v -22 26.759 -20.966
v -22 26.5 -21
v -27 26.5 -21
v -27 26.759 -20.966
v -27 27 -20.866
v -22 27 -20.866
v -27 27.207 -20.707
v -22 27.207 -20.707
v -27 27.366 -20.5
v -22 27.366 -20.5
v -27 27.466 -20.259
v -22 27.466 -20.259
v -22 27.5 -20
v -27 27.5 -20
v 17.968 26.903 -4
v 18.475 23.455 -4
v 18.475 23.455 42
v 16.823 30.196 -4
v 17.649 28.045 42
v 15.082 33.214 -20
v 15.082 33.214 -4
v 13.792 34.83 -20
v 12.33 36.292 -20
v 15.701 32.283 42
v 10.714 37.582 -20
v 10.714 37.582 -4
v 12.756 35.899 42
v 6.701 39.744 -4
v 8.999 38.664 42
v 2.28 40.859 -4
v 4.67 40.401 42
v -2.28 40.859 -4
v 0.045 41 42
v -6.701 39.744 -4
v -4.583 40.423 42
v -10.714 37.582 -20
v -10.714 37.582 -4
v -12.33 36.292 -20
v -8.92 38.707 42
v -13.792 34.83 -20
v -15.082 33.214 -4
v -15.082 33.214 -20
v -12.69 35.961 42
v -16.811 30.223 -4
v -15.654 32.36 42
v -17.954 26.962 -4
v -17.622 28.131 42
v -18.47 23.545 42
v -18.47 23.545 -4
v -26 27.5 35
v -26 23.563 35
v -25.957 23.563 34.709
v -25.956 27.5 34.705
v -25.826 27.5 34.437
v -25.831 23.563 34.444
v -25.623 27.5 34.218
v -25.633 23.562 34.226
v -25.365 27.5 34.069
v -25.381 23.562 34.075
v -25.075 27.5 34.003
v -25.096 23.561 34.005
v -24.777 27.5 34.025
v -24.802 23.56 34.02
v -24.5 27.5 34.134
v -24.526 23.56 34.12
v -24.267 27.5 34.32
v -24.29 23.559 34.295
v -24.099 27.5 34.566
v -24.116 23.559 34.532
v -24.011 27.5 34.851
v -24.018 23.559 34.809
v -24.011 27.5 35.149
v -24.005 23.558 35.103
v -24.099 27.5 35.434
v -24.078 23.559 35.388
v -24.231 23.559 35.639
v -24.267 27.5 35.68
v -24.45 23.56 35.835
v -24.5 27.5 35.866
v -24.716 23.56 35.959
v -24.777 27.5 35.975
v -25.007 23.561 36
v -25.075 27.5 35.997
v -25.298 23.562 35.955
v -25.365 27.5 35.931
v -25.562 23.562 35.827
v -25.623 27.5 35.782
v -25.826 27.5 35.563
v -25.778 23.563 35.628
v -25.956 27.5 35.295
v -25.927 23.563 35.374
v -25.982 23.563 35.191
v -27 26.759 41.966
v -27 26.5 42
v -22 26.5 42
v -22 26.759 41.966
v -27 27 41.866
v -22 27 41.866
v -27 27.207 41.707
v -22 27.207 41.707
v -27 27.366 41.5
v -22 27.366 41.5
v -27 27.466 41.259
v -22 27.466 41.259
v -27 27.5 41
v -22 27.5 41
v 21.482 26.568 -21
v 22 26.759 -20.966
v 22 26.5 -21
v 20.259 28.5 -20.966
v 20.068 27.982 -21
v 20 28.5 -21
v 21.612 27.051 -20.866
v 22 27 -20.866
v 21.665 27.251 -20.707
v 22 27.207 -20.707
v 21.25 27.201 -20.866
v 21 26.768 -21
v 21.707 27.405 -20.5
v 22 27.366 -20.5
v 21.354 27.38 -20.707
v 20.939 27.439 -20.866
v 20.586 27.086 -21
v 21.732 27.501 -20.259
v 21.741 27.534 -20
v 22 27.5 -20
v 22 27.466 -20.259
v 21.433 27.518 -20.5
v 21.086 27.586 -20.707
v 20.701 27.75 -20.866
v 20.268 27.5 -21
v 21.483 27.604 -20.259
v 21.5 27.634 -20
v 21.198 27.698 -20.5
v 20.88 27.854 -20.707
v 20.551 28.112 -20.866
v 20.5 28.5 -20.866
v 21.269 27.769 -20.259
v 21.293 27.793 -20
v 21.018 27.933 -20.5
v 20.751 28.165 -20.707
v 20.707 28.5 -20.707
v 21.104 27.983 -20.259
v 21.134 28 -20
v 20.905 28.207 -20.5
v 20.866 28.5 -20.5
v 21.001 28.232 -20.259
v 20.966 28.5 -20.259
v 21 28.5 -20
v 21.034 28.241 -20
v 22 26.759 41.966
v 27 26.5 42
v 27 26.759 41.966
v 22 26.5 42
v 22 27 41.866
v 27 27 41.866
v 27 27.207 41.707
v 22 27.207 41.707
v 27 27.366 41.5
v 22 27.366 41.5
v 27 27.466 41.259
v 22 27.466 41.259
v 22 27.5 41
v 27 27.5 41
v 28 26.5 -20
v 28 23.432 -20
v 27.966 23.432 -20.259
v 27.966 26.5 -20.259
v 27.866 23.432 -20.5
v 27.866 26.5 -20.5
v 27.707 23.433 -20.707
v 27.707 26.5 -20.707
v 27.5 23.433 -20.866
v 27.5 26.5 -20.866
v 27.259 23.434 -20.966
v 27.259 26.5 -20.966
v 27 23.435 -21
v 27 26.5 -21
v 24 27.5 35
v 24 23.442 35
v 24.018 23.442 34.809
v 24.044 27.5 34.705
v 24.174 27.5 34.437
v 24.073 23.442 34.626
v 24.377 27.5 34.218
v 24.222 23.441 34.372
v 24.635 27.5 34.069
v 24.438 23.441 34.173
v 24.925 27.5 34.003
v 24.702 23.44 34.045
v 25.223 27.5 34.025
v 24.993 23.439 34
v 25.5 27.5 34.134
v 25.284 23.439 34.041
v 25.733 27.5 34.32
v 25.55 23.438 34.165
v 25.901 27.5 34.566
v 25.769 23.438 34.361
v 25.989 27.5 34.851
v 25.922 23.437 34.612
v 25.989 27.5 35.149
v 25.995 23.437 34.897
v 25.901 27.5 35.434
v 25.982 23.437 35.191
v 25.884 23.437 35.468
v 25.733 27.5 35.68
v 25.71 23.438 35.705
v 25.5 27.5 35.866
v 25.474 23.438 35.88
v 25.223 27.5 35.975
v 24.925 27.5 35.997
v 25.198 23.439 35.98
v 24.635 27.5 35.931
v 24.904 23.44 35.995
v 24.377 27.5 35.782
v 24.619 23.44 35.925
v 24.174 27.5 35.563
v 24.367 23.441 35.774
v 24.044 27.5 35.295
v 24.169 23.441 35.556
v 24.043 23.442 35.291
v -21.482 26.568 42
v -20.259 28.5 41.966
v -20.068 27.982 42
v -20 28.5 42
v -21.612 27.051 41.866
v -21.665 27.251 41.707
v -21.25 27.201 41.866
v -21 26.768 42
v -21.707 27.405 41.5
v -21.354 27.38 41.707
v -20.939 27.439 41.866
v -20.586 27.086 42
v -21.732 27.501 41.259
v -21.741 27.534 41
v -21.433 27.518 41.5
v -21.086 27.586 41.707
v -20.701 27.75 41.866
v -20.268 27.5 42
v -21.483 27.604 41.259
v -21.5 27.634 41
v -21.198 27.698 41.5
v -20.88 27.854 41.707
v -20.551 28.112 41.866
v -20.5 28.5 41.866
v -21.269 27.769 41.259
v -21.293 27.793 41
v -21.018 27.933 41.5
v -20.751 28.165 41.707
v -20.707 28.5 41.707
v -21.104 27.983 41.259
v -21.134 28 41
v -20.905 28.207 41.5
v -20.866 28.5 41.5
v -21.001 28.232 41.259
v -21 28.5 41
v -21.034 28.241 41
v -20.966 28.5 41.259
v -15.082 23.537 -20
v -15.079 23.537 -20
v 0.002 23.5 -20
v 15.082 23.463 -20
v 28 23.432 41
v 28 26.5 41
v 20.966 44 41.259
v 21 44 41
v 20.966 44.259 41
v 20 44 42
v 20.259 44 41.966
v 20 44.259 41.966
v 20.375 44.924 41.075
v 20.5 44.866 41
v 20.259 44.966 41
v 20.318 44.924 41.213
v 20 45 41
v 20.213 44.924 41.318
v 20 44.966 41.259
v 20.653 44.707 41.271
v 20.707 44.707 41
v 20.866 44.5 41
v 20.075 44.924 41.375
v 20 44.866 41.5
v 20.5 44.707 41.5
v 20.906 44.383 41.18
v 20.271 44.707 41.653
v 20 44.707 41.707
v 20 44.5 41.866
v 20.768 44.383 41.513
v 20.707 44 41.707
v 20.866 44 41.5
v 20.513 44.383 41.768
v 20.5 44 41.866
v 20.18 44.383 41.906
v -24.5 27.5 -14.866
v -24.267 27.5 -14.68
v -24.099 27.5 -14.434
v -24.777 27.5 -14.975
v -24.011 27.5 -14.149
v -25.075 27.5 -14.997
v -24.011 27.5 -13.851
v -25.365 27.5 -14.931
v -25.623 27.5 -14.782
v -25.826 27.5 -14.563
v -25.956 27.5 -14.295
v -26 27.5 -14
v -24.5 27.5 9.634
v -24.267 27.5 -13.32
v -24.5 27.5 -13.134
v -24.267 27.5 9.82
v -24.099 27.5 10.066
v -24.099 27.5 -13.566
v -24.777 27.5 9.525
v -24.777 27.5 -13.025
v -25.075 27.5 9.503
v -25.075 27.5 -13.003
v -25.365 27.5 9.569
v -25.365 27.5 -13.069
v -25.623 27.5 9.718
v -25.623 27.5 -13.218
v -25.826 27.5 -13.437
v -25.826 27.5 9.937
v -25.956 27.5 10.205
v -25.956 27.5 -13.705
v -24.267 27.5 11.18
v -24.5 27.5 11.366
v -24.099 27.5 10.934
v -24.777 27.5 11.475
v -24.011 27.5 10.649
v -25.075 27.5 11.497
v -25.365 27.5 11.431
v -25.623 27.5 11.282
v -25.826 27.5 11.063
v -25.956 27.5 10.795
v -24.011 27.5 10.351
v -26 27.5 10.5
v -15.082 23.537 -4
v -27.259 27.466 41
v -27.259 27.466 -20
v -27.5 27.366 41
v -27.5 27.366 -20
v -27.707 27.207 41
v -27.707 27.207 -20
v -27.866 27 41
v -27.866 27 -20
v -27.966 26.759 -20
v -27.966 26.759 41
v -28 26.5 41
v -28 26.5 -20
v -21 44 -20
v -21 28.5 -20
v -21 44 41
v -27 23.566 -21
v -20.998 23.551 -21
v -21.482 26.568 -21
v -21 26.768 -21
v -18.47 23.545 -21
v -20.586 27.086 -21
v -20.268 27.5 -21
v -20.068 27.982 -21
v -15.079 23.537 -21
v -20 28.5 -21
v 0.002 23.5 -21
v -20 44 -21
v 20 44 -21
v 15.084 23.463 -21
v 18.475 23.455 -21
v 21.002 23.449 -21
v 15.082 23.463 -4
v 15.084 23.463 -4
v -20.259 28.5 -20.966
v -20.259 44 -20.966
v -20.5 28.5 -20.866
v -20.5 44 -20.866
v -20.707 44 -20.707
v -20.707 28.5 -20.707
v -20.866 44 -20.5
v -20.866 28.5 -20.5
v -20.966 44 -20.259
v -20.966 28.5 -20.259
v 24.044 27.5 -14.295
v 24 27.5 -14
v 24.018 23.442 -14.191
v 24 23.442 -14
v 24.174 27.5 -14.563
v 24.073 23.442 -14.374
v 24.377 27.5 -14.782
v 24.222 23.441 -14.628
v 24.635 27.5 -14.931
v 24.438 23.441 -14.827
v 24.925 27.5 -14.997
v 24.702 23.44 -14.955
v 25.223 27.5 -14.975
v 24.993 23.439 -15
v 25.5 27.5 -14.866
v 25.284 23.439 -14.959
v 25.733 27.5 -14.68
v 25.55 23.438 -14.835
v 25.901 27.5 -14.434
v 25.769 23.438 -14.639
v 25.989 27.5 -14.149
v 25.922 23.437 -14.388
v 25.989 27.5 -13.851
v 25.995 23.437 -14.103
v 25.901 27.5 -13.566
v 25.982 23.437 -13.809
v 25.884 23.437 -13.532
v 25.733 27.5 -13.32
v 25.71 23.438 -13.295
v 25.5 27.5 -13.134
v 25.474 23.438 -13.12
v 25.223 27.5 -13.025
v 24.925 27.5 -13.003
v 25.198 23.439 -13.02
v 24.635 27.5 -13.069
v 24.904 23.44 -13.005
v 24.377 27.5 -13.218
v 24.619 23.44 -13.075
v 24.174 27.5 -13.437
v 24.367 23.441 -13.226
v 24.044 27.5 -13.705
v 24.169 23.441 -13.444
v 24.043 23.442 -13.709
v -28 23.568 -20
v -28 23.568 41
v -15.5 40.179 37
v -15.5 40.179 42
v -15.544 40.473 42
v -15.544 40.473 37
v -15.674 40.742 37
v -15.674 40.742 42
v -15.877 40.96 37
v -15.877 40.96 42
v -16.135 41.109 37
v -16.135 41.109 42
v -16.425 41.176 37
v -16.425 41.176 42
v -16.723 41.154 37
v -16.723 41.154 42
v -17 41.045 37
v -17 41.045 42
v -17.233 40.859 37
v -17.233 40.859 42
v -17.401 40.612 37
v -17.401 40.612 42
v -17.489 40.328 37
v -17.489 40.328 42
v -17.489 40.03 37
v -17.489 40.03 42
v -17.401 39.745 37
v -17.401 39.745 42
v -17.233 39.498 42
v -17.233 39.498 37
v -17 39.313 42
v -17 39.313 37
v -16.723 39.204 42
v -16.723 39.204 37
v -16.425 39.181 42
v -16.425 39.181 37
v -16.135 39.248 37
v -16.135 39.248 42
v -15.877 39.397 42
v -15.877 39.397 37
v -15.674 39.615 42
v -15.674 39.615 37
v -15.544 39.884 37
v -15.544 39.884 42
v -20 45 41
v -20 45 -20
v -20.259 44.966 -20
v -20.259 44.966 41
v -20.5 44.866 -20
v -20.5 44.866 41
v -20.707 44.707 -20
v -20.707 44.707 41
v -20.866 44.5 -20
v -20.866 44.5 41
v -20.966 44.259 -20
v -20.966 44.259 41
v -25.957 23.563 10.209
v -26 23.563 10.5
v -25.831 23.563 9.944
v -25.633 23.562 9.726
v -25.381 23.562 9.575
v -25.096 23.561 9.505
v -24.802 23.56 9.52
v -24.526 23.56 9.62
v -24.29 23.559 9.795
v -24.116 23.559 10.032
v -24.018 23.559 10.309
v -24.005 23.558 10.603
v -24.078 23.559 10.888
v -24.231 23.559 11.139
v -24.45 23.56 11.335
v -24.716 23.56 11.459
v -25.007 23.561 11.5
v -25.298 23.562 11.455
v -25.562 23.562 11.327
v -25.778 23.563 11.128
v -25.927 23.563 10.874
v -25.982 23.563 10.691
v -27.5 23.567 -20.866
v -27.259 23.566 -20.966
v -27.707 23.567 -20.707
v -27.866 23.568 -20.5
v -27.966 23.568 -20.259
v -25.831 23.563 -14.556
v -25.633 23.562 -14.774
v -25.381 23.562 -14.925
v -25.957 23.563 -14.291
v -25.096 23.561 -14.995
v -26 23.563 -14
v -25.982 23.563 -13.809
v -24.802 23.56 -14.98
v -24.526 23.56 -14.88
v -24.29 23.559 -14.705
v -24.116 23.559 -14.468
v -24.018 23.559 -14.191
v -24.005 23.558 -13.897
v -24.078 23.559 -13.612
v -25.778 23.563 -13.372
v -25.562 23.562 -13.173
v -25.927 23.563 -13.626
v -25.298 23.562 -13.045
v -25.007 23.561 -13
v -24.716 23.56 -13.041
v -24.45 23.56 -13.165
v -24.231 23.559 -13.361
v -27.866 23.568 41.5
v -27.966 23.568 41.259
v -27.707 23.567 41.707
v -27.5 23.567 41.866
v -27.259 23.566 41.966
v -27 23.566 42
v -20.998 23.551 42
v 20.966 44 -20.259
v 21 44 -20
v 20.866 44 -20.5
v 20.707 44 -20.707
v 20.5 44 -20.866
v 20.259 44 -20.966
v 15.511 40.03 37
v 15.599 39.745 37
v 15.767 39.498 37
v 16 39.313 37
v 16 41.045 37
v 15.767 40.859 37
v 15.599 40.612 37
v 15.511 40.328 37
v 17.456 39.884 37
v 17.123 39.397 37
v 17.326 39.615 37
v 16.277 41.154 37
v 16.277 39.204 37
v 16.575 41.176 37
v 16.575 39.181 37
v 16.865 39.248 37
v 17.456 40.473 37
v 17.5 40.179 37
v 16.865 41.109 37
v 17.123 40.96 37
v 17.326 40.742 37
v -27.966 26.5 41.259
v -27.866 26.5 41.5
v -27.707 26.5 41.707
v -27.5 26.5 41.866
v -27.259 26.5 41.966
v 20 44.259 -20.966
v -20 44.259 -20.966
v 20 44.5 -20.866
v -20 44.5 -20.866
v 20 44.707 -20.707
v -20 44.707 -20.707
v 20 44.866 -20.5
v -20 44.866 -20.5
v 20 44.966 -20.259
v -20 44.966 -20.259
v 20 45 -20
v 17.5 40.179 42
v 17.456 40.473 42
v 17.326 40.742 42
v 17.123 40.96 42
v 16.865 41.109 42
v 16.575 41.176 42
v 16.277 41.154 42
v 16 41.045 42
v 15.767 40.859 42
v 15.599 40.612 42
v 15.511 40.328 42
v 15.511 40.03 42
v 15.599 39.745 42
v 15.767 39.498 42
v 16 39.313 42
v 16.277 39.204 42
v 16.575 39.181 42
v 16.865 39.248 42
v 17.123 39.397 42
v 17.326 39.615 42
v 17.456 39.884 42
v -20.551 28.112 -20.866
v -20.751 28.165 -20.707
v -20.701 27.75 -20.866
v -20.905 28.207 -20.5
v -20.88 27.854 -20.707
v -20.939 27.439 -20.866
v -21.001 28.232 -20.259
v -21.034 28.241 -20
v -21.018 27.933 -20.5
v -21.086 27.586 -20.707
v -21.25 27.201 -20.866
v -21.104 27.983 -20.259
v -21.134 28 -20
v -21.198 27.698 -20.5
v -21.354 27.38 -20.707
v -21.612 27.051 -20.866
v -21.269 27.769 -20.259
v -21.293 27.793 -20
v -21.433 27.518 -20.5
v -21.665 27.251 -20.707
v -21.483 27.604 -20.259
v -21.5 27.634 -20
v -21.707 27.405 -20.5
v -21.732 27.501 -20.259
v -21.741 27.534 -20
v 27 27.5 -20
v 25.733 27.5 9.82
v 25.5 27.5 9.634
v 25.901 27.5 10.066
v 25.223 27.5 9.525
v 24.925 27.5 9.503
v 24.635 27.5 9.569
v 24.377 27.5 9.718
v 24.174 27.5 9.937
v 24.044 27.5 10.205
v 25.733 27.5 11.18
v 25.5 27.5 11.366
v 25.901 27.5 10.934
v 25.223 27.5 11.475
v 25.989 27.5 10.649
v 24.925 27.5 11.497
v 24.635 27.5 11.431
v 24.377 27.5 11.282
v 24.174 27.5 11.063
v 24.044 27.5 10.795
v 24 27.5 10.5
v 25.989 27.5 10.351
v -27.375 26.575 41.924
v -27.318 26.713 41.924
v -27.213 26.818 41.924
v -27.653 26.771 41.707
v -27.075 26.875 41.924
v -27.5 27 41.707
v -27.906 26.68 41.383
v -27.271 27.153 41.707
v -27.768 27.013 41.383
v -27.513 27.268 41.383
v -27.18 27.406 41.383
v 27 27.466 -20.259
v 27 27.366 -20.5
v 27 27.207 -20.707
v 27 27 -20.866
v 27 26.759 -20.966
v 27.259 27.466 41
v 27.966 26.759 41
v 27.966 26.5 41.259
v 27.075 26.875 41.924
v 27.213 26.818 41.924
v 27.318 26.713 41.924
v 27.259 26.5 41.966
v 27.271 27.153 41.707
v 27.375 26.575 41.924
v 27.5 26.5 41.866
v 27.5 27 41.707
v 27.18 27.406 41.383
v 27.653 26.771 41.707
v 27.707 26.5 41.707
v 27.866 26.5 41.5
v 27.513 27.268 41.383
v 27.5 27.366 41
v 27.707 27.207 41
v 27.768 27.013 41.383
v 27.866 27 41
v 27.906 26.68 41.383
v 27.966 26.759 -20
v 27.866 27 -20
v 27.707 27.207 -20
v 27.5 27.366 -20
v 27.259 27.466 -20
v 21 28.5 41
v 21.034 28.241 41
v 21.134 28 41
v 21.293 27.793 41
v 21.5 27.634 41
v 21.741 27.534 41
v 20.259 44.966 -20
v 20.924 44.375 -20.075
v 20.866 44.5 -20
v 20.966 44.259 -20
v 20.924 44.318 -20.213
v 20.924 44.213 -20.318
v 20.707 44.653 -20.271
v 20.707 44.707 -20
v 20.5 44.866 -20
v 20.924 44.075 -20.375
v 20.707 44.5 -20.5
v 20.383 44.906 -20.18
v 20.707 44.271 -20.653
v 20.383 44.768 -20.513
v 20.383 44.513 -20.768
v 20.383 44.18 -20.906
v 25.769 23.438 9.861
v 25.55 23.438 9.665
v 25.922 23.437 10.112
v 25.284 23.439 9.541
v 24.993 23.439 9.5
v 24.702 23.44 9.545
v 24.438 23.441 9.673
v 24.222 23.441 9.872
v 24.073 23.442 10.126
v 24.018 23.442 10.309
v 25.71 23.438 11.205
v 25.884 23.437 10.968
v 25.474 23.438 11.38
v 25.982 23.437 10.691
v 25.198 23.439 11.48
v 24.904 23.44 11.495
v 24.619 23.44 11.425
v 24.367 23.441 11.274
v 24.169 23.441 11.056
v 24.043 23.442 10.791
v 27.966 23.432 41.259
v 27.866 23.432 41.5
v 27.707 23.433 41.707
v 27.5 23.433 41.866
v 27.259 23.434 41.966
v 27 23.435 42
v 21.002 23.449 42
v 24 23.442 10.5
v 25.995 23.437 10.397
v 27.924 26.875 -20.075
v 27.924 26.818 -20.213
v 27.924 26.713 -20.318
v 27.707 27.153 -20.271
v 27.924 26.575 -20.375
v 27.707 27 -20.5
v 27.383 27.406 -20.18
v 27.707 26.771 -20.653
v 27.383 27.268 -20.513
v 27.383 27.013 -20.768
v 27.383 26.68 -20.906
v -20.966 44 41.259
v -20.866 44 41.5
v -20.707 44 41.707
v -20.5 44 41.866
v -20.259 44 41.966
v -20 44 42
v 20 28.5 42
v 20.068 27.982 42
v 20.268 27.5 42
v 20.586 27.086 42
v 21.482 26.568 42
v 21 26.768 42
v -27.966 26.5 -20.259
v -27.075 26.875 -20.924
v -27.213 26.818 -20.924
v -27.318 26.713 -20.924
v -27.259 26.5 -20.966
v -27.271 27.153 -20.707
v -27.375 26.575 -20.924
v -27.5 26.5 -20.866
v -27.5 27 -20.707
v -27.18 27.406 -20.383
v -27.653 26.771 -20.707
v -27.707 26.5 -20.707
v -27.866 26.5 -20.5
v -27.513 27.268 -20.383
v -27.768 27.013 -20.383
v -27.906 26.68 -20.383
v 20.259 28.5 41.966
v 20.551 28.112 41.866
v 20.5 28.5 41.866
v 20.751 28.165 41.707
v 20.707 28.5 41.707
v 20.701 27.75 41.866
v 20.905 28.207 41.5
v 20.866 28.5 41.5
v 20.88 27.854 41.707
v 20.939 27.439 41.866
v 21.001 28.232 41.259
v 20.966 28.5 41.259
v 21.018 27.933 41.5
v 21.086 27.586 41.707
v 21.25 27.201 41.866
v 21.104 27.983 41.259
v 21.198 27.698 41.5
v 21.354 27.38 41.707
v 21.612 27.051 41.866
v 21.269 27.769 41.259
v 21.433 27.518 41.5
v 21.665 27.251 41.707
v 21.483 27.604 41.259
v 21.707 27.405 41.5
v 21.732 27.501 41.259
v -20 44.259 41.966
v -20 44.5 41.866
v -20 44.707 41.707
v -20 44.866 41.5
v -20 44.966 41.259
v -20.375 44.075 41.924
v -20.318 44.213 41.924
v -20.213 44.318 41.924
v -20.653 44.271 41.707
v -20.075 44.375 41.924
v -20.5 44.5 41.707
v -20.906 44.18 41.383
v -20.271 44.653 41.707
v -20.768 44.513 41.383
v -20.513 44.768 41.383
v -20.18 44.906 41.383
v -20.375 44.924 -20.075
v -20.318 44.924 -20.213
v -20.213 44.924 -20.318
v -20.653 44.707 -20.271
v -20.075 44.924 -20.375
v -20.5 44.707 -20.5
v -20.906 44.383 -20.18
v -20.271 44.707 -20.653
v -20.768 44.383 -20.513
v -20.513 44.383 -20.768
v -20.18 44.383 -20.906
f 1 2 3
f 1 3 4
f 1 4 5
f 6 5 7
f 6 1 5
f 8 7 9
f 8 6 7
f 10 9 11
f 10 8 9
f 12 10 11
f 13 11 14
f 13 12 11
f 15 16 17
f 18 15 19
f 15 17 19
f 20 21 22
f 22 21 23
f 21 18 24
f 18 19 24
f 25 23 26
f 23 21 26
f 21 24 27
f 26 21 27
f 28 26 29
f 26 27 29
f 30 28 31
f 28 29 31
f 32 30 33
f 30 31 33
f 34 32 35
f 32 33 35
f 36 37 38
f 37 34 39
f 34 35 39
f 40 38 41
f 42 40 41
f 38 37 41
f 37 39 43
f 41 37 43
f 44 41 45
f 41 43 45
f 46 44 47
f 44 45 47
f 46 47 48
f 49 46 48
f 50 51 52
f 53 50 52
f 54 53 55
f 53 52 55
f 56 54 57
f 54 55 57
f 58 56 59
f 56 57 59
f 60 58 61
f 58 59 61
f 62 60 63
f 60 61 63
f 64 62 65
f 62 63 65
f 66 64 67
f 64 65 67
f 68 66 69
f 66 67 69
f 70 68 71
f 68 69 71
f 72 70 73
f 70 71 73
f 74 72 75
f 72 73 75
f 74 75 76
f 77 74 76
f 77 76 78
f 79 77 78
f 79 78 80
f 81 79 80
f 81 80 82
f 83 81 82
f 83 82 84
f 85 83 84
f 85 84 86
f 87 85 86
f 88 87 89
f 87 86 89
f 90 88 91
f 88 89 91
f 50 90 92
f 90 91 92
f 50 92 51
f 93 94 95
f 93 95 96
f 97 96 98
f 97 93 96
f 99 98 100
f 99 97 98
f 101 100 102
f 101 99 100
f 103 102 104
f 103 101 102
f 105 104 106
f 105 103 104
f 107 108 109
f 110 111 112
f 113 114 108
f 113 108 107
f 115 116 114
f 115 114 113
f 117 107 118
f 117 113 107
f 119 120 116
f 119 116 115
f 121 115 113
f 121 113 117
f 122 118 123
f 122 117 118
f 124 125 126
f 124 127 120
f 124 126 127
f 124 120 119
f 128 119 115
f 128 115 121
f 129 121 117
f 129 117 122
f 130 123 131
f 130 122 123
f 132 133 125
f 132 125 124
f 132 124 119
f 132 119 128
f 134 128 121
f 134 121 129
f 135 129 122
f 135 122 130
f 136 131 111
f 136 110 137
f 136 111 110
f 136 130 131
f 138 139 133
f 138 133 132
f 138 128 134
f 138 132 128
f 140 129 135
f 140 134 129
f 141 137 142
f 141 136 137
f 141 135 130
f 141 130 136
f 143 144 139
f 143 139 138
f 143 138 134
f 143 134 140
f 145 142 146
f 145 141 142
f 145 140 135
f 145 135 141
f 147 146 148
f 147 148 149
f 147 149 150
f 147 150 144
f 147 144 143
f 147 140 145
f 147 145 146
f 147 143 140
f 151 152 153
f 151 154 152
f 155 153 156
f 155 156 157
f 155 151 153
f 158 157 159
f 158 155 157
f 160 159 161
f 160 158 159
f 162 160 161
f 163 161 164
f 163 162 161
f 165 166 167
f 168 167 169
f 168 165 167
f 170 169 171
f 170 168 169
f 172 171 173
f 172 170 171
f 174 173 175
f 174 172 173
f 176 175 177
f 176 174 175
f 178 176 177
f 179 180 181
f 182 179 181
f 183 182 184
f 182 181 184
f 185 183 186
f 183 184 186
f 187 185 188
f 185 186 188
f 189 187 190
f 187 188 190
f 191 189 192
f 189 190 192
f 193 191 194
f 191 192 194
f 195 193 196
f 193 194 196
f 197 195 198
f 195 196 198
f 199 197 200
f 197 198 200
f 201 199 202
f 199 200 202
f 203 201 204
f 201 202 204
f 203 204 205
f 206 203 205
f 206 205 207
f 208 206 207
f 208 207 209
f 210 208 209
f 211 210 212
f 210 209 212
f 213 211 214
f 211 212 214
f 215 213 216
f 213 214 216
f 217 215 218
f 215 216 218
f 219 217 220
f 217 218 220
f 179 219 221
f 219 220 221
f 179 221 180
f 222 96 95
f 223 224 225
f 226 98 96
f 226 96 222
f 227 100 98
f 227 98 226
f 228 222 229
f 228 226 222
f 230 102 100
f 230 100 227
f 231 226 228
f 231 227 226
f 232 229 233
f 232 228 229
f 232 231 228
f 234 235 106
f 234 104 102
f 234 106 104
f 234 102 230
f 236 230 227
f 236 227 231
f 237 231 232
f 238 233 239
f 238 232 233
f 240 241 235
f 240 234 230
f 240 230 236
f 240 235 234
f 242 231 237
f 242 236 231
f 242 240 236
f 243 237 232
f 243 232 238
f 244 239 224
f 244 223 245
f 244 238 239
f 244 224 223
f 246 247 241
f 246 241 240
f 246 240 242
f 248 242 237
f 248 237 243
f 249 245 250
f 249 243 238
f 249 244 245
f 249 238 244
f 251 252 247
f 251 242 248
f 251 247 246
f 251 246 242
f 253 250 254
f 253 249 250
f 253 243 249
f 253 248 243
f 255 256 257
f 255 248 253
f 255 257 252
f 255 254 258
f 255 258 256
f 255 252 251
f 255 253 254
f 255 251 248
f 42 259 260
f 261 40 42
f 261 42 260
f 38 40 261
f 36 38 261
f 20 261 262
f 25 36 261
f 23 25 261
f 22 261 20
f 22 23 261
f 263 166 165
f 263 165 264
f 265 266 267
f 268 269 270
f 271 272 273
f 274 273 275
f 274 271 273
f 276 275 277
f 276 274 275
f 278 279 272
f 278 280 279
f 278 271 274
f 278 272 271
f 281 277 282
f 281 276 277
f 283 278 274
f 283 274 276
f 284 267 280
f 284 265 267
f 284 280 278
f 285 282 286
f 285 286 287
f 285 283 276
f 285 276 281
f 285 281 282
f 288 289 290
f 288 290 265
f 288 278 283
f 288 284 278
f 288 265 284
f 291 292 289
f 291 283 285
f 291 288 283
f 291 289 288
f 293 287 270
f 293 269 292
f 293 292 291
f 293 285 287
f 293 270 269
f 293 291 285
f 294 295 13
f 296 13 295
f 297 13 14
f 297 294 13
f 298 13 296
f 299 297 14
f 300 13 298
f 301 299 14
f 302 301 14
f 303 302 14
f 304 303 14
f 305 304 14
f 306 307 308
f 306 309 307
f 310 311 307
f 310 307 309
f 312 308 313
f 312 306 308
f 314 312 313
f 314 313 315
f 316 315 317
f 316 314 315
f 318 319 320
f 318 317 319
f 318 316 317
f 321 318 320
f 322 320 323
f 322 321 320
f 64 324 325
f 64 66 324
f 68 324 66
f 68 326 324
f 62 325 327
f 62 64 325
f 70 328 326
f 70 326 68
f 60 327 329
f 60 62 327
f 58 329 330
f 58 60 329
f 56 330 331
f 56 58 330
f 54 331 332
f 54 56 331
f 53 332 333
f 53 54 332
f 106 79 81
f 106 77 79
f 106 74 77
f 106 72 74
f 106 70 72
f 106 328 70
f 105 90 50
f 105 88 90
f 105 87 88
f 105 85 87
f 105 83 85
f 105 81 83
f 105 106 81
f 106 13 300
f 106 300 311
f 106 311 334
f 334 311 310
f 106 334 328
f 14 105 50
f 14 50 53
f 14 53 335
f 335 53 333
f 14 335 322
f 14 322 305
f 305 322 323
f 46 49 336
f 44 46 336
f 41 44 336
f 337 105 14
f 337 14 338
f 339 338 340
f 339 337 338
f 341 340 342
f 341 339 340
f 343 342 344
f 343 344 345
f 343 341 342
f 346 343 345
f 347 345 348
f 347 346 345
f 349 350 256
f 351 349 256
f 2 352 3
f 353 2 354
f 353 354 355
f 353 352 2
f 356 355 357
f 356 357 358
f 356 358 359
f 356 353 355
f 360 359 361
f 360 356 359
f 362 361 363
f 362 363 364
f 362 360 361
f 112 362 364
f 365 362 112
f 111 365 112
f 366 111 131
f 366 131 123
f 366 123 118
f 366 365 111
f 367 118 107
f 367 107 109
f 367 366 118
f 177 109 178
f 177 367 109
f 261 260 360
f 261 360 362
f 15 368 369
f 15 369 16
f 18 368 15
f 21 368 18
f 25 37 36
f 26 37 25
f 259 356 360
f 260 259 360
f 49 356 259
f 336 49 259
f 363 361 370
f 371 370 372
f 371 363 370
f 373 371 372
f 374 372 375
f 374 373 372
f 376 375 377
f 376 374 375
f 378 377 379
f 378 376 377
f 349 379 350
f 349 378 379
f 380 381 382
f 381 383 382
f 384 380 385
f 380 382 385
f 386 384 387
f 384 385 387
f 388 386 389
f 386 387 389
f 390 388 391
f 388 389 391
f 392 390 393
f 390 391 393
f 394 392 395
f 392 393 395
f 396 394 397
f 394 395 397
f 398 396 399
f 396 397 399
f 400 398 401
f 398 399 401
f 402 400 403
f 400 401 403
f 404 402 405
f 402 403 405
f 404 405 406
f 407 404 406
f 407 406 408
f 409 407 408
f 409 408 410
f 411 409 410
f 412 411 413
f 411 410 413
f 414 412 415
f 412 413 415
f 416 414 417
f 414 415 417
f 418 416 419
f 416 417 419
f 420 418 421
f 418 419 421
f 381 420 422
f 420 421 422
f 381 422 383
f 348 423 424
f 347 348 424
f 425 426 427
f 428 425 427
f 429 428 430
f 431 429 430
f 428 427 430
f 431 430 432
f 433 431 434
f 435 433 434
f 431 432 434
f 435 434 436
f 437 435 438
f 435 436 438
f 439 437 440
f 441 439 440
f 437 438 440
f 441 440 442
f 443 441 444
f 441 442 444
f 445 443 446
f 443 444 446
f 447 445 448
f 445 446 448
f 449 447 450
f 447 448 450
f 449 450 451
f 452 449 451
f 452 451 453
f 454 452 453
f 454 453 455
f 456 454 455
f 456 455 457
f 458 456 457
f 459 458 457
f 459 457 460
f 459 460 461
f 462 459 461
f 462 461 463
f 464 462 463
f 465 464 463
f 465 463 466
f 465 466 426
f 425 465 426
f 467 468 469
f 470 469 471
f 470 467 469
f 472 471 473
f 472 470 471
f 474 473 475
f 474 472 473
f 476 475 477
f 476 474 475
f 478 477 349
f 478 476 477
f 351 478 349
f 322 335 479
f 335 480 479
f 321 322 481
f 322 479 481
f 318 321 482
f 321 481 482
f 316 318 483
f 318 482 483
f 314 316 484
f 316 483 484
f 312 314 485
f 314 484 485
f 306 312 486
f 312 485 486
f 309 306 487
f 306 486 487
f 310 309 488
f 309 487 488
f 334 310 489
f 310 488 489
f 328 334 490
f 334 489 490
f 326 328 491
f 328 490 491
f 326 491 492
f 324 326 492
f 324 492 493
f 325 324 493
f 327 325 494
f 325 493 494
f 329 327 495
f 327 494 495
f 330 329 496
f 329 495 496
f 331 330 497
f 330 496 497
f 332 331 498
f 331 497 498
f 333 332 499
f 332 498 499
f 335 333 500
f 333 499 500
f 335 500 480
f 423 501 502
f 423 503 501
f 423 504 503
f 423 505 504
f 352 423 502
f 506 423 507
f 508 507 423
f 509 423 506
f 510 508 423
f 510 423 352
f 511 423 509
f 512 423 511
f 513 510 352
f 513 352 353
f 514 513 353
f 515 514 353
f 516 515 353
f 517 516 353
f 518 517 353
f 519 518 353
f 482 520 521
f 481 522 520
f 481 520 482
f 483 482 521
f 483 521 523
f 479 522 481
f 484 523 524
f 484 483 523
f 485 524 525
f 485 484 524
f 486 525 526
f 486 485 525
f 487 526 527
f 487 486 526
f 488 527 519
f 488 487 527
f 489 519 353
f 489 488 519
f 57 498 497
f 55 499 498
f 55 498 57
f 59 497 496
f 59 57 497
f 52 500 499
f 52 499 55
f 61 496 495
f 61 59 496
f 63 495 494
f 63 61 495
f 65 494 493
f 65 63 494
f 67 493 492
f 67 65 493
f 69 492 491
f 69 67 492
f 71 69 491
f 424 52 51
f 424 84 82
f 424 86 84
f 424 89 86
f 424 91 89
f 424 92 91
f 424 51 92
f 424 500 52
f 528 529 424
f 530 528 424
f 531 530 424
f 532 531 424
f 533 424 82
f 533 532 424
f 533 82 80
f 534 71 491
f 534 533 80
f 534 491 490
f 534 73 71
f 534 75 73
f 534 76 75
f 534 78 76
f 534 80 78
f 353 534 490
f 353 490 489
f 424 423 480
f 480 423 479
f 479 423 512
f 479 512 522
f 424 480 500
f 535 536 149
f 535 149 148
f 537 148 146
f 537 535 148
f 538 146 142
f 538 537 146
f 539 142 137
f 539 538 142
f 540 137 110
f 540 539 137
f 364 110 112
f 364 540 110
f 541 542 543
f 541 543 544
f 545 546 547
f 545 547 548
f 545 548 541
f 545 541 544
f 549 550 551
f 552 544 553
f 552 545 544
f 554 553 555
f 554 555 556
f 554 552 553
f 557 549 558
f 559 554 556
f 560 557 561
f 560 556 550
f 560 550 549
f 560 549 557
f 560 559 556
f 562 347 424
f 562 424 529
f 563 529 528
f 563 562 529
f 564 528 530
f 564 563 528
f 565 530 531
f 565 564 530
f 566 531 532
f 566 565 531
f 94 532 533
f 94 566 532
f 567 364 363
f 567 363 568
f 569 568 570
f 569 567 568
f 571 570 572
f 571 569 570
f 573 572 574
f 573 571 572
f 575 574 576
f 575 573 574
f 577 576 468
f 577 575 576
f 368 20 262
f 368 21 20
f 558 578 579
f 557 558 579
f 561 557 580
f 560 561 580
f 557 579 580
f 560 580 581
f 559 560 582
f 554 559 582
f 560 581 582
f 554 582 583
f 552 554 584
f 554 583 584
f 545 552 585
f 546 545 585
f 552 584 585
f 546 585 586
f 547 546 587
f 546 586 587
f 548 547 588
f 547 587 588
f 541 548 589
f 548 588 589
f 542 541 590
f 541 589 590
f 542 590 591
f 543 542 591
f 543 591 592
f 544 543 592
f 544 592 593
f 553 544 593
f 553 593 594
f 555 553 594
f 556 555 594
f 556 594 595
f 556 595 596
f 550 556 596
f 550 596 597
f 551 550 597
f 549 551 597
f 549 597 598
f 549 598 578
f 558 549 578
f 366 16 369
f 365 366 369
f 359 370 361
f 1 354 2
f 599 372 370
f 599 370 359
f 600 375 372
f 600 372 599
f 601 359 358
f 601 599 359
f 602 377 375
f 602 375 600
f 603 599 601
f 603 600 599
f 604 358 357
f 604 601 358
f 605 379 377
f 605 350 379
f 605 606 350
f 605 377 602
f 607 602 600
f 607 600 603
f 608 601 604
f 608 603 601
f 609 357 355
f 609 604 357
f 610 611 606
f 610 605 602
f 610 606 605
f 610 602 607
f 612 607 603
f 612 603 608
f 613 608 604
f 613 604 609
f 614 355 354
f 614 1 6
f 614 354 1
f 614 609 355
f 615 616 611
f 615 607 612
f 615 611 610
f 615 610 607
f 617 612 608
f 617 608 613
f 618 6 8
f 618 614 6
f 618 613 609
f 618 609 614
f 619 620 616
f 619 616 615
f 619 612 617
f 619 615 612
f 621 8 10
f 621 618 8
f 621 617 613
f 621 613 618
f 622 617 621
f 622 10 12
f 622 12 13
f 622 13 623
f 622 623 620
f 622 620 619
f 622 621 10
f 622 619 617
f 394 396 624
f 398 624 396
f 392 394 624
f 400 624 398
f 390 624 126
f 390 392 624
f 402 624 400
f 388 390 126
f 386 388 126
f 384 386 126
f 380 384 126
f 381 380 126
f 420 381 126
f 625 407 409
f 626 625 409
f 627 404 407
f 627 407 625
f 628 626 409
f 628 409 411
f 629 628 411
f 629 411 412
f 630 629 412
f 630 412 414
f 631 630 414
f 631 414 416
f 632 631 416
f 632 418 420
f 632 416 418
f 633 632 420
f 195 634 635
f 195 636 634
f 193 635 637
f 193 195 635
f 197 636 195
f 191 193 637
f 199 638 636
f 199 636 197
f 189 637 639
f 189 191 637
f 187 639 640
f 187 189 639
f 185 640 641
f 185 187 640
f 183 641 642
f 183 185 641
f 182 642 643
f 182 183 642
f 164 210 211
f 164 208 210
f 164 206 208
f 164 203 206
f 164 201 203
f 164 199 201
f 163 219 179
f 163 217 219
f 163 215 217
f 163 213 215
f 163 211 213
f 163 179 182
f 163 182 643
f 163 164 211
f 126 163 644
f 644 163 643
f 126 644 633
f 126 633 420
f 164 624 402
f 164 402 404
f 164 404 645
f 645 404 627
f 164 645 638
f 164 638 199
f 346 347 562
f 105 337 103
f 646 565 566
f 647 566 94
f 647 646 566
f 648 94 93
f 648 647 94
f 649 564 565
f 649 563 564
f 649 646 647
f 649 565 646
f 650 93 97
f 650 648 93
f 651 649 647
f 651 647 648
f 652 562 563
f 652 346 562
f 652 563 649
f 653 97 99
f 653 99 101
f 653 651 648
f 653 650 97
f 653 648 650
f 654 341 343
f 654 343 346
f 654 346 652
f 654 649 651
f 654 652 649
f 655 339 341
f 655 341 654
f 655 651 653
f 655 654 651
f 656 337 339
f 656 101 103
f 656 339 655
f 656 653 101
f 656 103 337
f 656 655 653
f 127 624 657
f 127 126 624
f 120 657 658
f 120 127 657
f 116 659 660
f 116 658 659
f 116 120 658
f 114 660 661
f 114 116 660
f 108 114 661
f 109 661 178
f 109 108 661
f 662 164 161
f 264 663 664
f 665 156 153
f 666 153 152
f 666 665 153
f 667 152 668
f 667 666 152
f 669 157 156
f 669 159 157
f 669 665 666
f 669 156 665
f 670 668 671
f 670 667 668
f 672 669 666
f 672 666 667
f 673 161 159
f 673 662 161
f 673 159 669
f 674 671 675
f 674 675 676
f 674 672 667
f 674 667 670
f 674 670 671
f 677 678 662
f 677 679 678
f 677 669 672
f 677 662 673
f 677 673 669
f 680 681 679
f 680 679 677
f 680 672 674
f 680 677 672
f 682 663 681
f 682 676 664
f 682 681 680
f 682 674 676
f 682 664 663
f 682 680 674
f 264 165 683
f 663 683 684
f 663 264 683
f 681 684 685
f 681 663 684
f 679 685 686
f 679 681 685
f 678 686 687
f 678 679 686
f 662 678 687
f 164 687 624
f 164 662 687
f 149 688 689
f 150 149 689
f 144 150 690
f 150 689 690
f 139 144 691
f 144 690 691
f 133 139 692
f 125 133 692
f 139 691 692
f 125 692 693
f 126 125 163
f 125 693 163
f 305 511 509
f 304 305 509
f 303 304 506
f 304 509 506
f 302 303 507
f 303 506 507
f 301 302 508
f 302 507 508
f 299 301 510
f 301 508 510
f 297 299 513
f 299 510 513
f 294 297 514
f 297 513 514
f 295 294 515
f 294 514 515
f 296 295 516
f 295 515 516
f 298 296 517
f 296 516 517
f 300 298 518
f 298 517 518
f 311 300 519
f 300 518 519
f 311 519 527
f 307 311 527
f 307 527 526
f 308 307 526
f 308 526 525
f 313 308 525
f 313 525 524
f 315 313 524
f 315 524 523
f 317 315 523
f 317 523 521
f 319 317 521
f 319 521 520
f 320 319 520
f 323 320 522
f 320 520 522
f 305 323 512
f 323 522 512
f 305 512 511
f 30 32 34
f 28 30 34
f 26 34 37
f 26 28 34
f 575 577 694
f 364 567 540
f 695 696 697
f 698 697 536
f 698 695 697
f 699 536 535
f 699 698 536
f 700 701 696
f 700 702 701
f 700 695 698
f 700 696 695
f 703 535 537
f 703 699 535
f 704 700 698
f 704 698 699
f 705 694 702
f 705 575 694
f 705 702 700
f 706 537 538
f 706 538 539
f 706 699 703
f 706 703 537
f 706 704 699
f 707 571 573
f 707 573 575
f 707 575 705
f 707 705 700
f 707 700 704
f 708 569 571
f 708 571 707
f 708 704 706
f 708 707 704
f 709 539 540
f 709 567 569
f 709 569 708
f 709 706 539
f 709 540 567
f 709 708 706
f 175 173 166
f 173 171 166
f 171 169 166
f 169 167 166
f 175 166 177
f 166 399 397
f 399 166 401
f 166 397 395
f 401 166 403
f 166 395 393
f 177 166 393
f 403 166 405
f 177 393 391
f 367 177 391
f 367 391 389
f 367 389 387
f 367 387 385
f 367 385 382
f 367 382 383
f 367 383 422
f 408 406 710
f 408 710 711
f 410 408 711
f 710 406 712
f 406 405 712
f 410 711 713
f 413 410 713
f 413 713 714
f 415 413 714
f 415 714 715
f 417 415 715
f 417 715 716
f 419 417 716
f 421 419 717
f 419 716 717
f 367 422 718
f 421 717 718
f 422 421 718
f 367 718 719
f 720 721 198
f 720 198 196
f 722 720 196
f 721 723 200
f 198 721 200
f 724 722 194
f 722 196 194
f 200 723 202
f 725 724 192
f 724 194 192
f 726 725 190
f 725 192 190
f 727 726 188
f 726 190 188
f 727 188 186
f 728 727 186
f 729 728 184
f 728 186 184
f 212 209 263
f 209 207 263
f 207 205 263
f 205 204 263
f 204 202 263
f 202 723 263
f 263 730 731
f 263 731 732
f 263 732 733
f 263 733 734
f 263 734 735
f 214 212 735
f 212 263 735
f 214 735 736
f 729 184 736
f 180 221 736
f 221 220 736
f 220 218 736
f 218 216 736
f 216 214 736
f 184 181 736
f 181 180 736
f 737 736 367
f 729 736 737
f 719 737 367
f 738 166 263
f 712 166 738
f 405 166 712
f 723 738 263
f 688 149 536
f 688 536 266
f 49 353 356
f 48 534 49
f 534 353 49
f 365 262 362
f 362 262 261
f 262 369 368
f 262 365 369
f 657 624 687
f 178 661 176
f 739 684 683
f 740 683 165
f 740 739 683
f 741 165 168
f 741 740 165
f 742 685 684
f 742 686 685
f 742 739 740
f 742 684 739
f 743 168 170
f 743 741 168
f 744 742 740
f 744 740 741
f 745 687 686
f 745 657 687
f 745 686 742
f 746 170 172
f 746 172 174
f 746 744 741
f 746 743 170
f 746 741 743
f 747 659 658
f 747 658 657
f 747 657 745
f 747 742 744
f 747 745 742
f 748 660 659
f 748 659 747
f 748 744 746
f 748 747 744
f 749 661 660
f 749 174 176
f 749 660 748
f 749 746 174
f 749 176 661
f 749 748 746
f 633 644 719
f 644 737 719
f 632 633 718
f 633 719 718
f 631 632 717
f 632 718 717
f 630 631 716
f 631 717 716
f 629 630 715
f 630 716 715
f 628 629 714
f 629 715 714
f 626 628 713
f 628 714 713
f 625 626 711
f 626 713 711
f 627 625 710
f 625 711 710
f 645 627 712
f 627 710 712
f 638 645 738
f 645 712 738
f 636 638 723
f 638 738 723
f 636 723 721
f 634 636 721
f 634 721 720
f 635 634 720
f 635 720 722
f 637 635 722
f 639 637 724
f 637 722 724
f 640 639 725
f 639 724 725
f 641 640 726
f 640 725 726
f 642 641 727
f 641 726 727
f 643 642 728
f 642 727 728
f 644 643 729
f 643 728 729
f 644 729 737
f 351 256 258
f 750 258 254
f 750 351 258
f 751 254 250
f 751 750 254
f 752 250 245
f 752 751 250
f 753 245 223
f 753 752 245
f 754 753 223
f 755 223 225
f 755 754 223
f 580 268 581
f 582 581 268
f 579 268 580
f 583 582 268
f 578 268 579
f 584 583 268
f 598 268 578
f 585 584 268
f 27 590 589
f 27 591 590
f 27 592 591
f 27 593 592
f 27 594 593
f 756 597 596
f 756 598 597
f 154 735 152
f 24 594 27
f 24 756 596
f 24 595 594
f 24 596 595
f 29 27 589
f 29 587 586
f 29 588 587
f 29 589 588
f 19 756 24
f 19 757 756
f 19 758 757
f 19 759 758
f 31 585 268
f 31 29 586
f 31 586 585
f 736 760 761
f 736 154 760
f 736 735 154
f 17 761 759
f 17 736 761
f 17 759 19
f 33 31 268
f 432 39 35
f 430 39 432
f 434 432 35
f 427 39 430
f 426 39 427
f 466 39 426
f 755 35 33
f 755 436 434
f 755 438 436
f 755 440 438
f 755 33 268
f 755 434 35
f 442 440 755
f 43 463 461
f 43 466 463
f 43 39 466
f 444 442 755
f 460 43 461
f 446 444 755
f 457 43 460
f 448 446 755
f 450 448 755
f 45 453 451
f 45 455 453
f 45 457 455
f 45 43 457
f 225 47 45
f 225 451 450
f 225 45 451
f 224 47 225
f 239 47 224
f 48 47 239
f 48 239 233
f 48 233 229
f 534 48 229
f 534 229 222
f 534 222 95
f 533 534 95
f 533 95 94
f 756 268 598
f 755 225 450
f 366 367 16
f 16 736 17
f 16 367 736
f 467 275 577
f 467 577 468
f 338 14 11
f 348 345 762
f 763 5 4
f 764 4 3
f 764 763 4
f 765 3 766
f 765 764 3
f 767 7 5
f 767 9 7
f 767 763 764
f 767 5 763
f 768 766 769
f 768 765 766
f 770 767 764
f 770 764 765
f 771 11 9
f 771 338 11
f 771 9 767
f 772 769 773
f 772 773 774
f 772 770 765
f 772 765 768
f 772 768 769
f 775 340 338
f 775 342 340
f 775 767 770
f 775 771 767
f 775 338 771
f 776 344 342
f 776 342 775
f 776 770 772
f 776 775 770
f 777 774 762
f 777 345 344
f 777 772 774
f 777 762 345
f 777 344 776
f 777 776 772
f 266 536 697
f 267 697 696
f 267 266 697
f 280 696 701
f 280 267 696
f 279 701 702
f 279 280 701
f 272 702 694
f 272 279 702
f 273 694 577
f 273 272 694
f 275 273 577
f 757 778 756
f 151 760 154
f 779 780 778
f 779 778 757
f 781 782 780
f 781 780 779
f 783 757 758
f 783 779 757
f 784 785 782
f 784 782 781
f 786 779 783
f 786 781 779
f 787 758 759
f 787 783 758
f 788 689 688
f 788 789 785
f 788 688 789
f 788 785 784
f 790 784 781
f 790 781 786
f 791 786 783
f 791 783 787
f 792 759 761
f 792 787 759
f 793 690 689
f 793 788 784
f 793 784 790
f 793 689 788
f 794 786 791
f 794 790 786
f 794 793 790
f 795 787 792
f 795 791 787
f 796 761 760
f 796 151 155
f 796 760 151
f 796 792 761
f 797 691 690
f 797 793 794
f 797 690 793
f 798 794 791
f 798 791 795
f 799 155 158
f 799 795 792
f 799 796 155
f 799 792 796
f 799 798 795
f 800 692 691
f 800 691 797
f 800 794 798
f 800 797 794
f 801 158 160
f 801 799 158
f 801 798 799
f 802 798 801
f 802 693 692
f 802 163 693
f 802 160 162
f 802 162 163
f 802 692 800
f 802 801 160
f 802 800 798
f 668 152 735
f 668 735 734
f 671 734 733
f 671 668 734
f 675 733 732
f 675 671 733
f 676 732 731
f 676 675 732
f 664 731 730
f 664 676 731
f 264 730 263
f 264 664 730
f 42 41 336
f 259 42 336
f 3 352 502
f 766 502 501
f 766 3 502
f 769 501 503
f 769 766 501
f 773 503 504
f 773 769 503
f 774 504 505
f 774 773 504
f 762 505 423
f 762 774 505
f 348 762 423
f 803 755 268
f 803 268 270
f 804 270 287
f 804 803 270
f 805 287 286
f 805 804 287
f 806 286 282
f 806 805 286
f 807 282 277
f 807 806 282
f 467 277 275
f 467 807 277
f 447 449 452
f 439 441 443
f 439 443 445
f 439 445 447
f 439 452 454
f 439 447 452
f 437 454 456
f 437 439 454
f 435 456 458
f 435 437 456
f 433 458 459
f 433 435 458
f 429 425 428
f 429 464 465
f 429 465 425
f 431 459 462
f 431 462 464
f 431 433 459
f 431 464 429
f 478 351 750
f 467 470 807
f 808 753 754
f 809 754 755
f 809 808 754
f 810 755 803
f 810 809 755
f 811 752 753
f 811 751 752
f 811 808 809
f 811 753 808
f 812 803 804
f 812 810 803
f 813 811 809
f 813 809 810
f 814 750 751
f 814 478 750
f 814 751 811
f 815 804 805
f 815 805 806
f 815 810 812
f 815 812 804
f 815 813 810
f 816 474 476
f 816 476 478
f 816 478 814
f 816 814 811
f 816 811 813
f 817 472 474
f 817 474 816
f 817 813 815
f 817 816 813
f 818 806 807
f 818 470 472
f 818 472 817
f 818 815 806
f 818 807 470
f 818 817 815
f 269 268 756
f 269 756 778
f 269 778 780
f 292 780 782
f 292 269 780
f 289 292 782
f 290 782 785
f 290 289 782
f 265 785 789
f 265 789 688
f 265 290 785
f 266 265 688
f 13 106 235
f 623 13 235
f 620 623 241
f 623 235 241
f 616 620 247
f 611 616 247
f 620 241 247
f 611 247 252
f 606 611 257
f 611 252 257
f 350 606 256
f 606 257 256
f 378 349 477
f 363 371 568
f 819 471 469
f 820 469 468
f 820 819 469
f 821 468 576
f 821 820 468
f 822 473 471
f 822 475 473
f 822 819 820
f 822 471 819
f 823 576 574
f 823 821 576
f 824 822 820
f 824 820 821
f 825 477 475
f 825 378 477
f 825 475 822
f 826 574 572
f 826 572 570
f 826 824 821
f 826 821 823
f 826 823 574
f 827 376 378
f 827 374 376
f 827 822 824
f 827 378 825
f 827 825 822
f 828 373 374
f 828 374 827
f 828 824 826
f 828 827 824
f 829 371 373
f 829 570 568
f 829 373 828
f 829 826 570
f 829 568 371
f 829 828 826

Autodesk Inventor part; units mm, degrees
ref_plane "YZ Plane" through (0, 0, 0) normal (1, 0, 0) x (0, 1, 0)
ref_plane "XZ Plane" through (0, 0, 0) normal (0, 1, 0) x (-1, 0, 0)
ref_plane "XY Plane" through (0, 0, 0) normal (0, 0, 1) x (1, 0, 0)
sketch "Sketch1" plane through (0, 0, 0) normal (0, 1, 0) x (-1, 0, 0)
  circle A0 centre (0, 0) radius 11 construction
  circle A1 centre (0, 0) radius 3.75
  circle A2 centre (0, 0) radius 7.875 construction
  line L0 (16.292, 0) -> (-19, 0) construction
  line L1 (0, 21) -> (0, -27.3544) construction
  line L2 (0, -21) -> (21, -21)
  line L3 (0, -21) -> (-21, -21)
  line L4 (0, 0) -> (21, -21) construction
  circle A3 centre (5.5685, -5.5685) radius 0.75
  circle A4 centre (-5.5685, -5.5685) radius 0.75
  circle A5 centre (5.5685, 5.5685) radius 0.75
  circle A6 centre (-5.5685, 5.5685) radius 0.75
  line L5 (-28, -21) -> (-21, -21)
  line L6 (28, -21) -> (21, -21)
  circle A7 centre (25, -14) radius 1
  circle A8 centre (-25, -14) radius 1
  line L7 (-28, 42) -> (28, 42)
  line L8 (28, -21) -> (28, 42)
  line L9 (21, -21) -> (21, 42)
  line L10 (-21, -21) -> (-21, 42)
  line L11 (-28, -21) -> (-28, 42)
  line L12 (28, 10.5) -> (-28, 10.5) construction
  circle A9 centre (25, 35) radius 1
  circle A10 centre (-25, 35) radius 1
  circle A11 centre (25, 10.5) radius 1
  circle A12 centre (-25, 10.5) radius 1
  circle A13 centre (5.5685, 5.5685) radius 1.5
  circle A14 centre (5.5685, -5.5685) radius 1.5
  circle A15 centre (-5.5685, 5.5685) radius 1.5
  circle A16 centre (-5.5685, -5.5685) radius 1.5
  dimension "d8" = 15.75
  dimension "d2" = 7.5
  dimension "d4" = 22
  dimension "d17" = 21
  dimension "d26" = 1.5
  dimension "d38" = 63
  dimension "d39" = 21
  dimension "d40" = 2
  dimension "d41" = 2
  dimension "d53" = 3
  dimension "d97" = 7
  dimension "d98" = 3
  dimension "d99" = 3
extrude "Extrusion9" add sketch "Sketch1" along normal blind 45 contours A1 | L3 L10 L7 L9 L2 | A3 | A4 | A5 | A6 | A13 | A14 | A15 | A16
extrude "Extrusion10" add sketch "Sketch1" along normal blind 27.5 contours L9 L7 L8 L6 | L5 L11 L7 L10
extrude "Extrusion11" cut sketch "Sketch1" along normal blind 17.5 contours L9 L7 L8 L6 | L5 L11 L7 L10
extrude "Extrusion13" cut sketch "Sketch1" along normal blind 6 contours A1 | A3 | A4 | A5 | A6 | A13 | A14 | A15 | A16
extrude "Extrusion15" add sketch "Sketch1" along normal blind 3.5 contours A13 | A14 | A15 | A16
sketch "Sketch5" plane through (-21, 45, 42) normal (0, 0, 1) x (1, 0, 0)
  line L0 (0, -45) -> (42, -45) construction
  line L1 (0, -17.5) -> (0, 0) construction
  line L2 (42, -45) -> (0, -45) construction
  line L3 (0, -45) -> (0, 0) construction
  line L4 (0, 0) -> (42, 0) construction
  line L5 (42, 0) -> (42, -45) construction
  line L6 (42, 0) -> (0, -45) construction
  line L7 (0, 0) -> (42, 0) construction
  line L8 (0, 0) -> (42, -45) construction
  circle A0 centre (21, -22.5) radius 18.5
  line L9 (10.2856, -7.4185) -> (31.7144, -7.4185)
  line L10 (5.9185, -11.7856) -> (5.9185, -33.2144)
  line L11 (36.0815, -11.7856) -> (36.0815, -33.2144)
  circle A1 centre (21, -22.5) radius 13.5 construction
  line L12 (34.0815, -9.4185) -> (7.9185, -35.5815) construction
  line L13 (21, -45) -> (21, 0) construction
  line L14 (7.9185, -9.4185) -> (34.0815, -35.5815) construction
  line L15 (7.9185, -9.4185) -> (34.0815, -9.4185) construction
  line L16 (7.9185, -9.4185) -> (7.9185, -35.5815) construction
  line L17 (34.0815, -35.5815) -> (34.0815, -9.4185) construction
  circle A2 centre (4.5, -40.1786) radius 1
  circle A3 centre (37.5, -40.1786) radius 1
  circle A4 centre (4.5, -4.8214) radius 1
  circle A5 centre (37.5, -4.8214) radius 1
  line L18 (50, -22.5352) -> (50, -23.5001)
  line L19 (50, -22.5352) -> (-3.9988, -22.4696) construction
  line L20 (50, -23.5001) -> (42, -23.5001)
  line L21 (42, -23.5001) -> (39.473, -23.5)
  line L22 (39.473, -23.5) -> (36.0815, -23.5)
  line L23 (36.0815, -23.5) -> (21, -23.5)
  line L24 (50, -23.5001) -> (50, -45)
  line L25 (50, -45) -> (21, -45)
  line L26 (-8, -23.5001) -> (0, -23.5001)
  line L27 (0, -23.5001) -> (2.527, -23.5)
  line L28 (2.527, -23.5) -> (5.9185, -23.5)
  line L29 (5.9185, -23.5) -> (21, -23.5)
  line L30 (-8, -23.5001) -> (-8, -45)
  line L31 (-8, -45) -> (21, -45)
  line L32 (-8, -22.4648) -> (-8, -23.5001)
  line L33 (50, -22.5352) -> (50.0023, -21.5703)
  line L34 (50.0023, -21.5703) -> (42.0024, -21.5509)
  line L35 (42.0024, -21.5509) -> (39.4753, -21.5449)
  line L36 (39.4753, -21.5449) -> (36.0839, -21.5367)
  line L37 (36.0839, -21.5367) -> (21.0024, -21.5)
  line L38 (50.0023, -21.5703) -> (50.0546, -0.0706)
  line L39 (50.0546, -0.0706) -> (21.0547, -0.0001)
  line L40 (-7.9452, 0.0704) -> (21.0547, -0.0001)
  line L41 (-7.9975, -21.4294) -> (-7.9452, 0.0704)
  line L42 (-7.9975, -21.4294) -> (0.0025, -21.4488)
  line L43 (0.0025, -21.4488) -> (2.5295, -21.4551)
  line L44 (2.5295, -21.4551) -> (5.921, -21.4633)
  line L45 (5.921, -21.4633) -> (21.0024, -21.5)
  line L46 (-8, -22.4648) -> (-7.9975, -21.4294)
  point P0 (39.5, -22.5225)
  dimension "d58" = 37
  dimension "d70" = 27
  dimension "d73" = 2
  dimension "d74" = 45
  dimension "d75" = 2
  dimension "d76" = 2
  dimension "d77" = 42
  dimension "d79" = 2
  dimension "d80" = 4.5
  dimension "d89" = 1
  dimension "d90" = 1
  dimension "d93" = 29
extrude "Extrusion16" cut sketch "Sketch5" against normal blind 62 contours L11 L37 L45 L44 L10 A0 L9 | A0 L10 L29 L23 L11 | L23 L29 L10 L44 L45 L37 L11
extrude "Extrusion18" cut sketch "Sketch5" against normal blind 46 contours A0 L22 L11 L37 L36 | L36 L37 L11 A0 | A0 L11 L22 | L9 A0 | A0 L28 L10 | A0 L44 L10 L28 | L10 L44 A0
extrude "Extrusion19" cut sketch "Sketch5" against normal blind 5 contours A2 | A3 | A4 | A5
extrude "Extrusion23" cut sketch "Sketch5" against normal blind 70 contours A0 L22 L11 L37 L36 | A0 L35 L34 L33 L18 L20 L21 | L21 L20 L24 L25 L31 L30 L26 L27 A0 | A0 L11 L22 | A0 L10 L29 L23 L11 | L23 L29 L10 L44 L45 L37 L11 | A0 L28 L10 | L27 L26 L32 L46 L42 L43 A0 | A0 L44 L10 L28 | A2 | A3
fillet "Fillet1" radius 1 20 edges at (-28, 27.5, 10.5) (-24.5, 27.5, 42) (-28, 25.5341, 42) (-21, 27.5, 10.5) (-24.5, 27.5, -21) (-28, 25.5341, -21) (-21, 36.25, -21) (-21, 45, 10.5) (0, 45, -21) (21, 36.25, -21) (24.5, 27.5, -21) (28, 25.466, -21) (21, 27.5, 10.5) (28, 27.5, 10.5) (21, 36.25, 42) (0, 45, 42) (21, 45, 10.5) (-21, 36.25, 42) (24.5, 27.5, 42) (28, 25.466, 42)
equation "\"d41\" = d40"
properties part number "engine_sleeve_down"
